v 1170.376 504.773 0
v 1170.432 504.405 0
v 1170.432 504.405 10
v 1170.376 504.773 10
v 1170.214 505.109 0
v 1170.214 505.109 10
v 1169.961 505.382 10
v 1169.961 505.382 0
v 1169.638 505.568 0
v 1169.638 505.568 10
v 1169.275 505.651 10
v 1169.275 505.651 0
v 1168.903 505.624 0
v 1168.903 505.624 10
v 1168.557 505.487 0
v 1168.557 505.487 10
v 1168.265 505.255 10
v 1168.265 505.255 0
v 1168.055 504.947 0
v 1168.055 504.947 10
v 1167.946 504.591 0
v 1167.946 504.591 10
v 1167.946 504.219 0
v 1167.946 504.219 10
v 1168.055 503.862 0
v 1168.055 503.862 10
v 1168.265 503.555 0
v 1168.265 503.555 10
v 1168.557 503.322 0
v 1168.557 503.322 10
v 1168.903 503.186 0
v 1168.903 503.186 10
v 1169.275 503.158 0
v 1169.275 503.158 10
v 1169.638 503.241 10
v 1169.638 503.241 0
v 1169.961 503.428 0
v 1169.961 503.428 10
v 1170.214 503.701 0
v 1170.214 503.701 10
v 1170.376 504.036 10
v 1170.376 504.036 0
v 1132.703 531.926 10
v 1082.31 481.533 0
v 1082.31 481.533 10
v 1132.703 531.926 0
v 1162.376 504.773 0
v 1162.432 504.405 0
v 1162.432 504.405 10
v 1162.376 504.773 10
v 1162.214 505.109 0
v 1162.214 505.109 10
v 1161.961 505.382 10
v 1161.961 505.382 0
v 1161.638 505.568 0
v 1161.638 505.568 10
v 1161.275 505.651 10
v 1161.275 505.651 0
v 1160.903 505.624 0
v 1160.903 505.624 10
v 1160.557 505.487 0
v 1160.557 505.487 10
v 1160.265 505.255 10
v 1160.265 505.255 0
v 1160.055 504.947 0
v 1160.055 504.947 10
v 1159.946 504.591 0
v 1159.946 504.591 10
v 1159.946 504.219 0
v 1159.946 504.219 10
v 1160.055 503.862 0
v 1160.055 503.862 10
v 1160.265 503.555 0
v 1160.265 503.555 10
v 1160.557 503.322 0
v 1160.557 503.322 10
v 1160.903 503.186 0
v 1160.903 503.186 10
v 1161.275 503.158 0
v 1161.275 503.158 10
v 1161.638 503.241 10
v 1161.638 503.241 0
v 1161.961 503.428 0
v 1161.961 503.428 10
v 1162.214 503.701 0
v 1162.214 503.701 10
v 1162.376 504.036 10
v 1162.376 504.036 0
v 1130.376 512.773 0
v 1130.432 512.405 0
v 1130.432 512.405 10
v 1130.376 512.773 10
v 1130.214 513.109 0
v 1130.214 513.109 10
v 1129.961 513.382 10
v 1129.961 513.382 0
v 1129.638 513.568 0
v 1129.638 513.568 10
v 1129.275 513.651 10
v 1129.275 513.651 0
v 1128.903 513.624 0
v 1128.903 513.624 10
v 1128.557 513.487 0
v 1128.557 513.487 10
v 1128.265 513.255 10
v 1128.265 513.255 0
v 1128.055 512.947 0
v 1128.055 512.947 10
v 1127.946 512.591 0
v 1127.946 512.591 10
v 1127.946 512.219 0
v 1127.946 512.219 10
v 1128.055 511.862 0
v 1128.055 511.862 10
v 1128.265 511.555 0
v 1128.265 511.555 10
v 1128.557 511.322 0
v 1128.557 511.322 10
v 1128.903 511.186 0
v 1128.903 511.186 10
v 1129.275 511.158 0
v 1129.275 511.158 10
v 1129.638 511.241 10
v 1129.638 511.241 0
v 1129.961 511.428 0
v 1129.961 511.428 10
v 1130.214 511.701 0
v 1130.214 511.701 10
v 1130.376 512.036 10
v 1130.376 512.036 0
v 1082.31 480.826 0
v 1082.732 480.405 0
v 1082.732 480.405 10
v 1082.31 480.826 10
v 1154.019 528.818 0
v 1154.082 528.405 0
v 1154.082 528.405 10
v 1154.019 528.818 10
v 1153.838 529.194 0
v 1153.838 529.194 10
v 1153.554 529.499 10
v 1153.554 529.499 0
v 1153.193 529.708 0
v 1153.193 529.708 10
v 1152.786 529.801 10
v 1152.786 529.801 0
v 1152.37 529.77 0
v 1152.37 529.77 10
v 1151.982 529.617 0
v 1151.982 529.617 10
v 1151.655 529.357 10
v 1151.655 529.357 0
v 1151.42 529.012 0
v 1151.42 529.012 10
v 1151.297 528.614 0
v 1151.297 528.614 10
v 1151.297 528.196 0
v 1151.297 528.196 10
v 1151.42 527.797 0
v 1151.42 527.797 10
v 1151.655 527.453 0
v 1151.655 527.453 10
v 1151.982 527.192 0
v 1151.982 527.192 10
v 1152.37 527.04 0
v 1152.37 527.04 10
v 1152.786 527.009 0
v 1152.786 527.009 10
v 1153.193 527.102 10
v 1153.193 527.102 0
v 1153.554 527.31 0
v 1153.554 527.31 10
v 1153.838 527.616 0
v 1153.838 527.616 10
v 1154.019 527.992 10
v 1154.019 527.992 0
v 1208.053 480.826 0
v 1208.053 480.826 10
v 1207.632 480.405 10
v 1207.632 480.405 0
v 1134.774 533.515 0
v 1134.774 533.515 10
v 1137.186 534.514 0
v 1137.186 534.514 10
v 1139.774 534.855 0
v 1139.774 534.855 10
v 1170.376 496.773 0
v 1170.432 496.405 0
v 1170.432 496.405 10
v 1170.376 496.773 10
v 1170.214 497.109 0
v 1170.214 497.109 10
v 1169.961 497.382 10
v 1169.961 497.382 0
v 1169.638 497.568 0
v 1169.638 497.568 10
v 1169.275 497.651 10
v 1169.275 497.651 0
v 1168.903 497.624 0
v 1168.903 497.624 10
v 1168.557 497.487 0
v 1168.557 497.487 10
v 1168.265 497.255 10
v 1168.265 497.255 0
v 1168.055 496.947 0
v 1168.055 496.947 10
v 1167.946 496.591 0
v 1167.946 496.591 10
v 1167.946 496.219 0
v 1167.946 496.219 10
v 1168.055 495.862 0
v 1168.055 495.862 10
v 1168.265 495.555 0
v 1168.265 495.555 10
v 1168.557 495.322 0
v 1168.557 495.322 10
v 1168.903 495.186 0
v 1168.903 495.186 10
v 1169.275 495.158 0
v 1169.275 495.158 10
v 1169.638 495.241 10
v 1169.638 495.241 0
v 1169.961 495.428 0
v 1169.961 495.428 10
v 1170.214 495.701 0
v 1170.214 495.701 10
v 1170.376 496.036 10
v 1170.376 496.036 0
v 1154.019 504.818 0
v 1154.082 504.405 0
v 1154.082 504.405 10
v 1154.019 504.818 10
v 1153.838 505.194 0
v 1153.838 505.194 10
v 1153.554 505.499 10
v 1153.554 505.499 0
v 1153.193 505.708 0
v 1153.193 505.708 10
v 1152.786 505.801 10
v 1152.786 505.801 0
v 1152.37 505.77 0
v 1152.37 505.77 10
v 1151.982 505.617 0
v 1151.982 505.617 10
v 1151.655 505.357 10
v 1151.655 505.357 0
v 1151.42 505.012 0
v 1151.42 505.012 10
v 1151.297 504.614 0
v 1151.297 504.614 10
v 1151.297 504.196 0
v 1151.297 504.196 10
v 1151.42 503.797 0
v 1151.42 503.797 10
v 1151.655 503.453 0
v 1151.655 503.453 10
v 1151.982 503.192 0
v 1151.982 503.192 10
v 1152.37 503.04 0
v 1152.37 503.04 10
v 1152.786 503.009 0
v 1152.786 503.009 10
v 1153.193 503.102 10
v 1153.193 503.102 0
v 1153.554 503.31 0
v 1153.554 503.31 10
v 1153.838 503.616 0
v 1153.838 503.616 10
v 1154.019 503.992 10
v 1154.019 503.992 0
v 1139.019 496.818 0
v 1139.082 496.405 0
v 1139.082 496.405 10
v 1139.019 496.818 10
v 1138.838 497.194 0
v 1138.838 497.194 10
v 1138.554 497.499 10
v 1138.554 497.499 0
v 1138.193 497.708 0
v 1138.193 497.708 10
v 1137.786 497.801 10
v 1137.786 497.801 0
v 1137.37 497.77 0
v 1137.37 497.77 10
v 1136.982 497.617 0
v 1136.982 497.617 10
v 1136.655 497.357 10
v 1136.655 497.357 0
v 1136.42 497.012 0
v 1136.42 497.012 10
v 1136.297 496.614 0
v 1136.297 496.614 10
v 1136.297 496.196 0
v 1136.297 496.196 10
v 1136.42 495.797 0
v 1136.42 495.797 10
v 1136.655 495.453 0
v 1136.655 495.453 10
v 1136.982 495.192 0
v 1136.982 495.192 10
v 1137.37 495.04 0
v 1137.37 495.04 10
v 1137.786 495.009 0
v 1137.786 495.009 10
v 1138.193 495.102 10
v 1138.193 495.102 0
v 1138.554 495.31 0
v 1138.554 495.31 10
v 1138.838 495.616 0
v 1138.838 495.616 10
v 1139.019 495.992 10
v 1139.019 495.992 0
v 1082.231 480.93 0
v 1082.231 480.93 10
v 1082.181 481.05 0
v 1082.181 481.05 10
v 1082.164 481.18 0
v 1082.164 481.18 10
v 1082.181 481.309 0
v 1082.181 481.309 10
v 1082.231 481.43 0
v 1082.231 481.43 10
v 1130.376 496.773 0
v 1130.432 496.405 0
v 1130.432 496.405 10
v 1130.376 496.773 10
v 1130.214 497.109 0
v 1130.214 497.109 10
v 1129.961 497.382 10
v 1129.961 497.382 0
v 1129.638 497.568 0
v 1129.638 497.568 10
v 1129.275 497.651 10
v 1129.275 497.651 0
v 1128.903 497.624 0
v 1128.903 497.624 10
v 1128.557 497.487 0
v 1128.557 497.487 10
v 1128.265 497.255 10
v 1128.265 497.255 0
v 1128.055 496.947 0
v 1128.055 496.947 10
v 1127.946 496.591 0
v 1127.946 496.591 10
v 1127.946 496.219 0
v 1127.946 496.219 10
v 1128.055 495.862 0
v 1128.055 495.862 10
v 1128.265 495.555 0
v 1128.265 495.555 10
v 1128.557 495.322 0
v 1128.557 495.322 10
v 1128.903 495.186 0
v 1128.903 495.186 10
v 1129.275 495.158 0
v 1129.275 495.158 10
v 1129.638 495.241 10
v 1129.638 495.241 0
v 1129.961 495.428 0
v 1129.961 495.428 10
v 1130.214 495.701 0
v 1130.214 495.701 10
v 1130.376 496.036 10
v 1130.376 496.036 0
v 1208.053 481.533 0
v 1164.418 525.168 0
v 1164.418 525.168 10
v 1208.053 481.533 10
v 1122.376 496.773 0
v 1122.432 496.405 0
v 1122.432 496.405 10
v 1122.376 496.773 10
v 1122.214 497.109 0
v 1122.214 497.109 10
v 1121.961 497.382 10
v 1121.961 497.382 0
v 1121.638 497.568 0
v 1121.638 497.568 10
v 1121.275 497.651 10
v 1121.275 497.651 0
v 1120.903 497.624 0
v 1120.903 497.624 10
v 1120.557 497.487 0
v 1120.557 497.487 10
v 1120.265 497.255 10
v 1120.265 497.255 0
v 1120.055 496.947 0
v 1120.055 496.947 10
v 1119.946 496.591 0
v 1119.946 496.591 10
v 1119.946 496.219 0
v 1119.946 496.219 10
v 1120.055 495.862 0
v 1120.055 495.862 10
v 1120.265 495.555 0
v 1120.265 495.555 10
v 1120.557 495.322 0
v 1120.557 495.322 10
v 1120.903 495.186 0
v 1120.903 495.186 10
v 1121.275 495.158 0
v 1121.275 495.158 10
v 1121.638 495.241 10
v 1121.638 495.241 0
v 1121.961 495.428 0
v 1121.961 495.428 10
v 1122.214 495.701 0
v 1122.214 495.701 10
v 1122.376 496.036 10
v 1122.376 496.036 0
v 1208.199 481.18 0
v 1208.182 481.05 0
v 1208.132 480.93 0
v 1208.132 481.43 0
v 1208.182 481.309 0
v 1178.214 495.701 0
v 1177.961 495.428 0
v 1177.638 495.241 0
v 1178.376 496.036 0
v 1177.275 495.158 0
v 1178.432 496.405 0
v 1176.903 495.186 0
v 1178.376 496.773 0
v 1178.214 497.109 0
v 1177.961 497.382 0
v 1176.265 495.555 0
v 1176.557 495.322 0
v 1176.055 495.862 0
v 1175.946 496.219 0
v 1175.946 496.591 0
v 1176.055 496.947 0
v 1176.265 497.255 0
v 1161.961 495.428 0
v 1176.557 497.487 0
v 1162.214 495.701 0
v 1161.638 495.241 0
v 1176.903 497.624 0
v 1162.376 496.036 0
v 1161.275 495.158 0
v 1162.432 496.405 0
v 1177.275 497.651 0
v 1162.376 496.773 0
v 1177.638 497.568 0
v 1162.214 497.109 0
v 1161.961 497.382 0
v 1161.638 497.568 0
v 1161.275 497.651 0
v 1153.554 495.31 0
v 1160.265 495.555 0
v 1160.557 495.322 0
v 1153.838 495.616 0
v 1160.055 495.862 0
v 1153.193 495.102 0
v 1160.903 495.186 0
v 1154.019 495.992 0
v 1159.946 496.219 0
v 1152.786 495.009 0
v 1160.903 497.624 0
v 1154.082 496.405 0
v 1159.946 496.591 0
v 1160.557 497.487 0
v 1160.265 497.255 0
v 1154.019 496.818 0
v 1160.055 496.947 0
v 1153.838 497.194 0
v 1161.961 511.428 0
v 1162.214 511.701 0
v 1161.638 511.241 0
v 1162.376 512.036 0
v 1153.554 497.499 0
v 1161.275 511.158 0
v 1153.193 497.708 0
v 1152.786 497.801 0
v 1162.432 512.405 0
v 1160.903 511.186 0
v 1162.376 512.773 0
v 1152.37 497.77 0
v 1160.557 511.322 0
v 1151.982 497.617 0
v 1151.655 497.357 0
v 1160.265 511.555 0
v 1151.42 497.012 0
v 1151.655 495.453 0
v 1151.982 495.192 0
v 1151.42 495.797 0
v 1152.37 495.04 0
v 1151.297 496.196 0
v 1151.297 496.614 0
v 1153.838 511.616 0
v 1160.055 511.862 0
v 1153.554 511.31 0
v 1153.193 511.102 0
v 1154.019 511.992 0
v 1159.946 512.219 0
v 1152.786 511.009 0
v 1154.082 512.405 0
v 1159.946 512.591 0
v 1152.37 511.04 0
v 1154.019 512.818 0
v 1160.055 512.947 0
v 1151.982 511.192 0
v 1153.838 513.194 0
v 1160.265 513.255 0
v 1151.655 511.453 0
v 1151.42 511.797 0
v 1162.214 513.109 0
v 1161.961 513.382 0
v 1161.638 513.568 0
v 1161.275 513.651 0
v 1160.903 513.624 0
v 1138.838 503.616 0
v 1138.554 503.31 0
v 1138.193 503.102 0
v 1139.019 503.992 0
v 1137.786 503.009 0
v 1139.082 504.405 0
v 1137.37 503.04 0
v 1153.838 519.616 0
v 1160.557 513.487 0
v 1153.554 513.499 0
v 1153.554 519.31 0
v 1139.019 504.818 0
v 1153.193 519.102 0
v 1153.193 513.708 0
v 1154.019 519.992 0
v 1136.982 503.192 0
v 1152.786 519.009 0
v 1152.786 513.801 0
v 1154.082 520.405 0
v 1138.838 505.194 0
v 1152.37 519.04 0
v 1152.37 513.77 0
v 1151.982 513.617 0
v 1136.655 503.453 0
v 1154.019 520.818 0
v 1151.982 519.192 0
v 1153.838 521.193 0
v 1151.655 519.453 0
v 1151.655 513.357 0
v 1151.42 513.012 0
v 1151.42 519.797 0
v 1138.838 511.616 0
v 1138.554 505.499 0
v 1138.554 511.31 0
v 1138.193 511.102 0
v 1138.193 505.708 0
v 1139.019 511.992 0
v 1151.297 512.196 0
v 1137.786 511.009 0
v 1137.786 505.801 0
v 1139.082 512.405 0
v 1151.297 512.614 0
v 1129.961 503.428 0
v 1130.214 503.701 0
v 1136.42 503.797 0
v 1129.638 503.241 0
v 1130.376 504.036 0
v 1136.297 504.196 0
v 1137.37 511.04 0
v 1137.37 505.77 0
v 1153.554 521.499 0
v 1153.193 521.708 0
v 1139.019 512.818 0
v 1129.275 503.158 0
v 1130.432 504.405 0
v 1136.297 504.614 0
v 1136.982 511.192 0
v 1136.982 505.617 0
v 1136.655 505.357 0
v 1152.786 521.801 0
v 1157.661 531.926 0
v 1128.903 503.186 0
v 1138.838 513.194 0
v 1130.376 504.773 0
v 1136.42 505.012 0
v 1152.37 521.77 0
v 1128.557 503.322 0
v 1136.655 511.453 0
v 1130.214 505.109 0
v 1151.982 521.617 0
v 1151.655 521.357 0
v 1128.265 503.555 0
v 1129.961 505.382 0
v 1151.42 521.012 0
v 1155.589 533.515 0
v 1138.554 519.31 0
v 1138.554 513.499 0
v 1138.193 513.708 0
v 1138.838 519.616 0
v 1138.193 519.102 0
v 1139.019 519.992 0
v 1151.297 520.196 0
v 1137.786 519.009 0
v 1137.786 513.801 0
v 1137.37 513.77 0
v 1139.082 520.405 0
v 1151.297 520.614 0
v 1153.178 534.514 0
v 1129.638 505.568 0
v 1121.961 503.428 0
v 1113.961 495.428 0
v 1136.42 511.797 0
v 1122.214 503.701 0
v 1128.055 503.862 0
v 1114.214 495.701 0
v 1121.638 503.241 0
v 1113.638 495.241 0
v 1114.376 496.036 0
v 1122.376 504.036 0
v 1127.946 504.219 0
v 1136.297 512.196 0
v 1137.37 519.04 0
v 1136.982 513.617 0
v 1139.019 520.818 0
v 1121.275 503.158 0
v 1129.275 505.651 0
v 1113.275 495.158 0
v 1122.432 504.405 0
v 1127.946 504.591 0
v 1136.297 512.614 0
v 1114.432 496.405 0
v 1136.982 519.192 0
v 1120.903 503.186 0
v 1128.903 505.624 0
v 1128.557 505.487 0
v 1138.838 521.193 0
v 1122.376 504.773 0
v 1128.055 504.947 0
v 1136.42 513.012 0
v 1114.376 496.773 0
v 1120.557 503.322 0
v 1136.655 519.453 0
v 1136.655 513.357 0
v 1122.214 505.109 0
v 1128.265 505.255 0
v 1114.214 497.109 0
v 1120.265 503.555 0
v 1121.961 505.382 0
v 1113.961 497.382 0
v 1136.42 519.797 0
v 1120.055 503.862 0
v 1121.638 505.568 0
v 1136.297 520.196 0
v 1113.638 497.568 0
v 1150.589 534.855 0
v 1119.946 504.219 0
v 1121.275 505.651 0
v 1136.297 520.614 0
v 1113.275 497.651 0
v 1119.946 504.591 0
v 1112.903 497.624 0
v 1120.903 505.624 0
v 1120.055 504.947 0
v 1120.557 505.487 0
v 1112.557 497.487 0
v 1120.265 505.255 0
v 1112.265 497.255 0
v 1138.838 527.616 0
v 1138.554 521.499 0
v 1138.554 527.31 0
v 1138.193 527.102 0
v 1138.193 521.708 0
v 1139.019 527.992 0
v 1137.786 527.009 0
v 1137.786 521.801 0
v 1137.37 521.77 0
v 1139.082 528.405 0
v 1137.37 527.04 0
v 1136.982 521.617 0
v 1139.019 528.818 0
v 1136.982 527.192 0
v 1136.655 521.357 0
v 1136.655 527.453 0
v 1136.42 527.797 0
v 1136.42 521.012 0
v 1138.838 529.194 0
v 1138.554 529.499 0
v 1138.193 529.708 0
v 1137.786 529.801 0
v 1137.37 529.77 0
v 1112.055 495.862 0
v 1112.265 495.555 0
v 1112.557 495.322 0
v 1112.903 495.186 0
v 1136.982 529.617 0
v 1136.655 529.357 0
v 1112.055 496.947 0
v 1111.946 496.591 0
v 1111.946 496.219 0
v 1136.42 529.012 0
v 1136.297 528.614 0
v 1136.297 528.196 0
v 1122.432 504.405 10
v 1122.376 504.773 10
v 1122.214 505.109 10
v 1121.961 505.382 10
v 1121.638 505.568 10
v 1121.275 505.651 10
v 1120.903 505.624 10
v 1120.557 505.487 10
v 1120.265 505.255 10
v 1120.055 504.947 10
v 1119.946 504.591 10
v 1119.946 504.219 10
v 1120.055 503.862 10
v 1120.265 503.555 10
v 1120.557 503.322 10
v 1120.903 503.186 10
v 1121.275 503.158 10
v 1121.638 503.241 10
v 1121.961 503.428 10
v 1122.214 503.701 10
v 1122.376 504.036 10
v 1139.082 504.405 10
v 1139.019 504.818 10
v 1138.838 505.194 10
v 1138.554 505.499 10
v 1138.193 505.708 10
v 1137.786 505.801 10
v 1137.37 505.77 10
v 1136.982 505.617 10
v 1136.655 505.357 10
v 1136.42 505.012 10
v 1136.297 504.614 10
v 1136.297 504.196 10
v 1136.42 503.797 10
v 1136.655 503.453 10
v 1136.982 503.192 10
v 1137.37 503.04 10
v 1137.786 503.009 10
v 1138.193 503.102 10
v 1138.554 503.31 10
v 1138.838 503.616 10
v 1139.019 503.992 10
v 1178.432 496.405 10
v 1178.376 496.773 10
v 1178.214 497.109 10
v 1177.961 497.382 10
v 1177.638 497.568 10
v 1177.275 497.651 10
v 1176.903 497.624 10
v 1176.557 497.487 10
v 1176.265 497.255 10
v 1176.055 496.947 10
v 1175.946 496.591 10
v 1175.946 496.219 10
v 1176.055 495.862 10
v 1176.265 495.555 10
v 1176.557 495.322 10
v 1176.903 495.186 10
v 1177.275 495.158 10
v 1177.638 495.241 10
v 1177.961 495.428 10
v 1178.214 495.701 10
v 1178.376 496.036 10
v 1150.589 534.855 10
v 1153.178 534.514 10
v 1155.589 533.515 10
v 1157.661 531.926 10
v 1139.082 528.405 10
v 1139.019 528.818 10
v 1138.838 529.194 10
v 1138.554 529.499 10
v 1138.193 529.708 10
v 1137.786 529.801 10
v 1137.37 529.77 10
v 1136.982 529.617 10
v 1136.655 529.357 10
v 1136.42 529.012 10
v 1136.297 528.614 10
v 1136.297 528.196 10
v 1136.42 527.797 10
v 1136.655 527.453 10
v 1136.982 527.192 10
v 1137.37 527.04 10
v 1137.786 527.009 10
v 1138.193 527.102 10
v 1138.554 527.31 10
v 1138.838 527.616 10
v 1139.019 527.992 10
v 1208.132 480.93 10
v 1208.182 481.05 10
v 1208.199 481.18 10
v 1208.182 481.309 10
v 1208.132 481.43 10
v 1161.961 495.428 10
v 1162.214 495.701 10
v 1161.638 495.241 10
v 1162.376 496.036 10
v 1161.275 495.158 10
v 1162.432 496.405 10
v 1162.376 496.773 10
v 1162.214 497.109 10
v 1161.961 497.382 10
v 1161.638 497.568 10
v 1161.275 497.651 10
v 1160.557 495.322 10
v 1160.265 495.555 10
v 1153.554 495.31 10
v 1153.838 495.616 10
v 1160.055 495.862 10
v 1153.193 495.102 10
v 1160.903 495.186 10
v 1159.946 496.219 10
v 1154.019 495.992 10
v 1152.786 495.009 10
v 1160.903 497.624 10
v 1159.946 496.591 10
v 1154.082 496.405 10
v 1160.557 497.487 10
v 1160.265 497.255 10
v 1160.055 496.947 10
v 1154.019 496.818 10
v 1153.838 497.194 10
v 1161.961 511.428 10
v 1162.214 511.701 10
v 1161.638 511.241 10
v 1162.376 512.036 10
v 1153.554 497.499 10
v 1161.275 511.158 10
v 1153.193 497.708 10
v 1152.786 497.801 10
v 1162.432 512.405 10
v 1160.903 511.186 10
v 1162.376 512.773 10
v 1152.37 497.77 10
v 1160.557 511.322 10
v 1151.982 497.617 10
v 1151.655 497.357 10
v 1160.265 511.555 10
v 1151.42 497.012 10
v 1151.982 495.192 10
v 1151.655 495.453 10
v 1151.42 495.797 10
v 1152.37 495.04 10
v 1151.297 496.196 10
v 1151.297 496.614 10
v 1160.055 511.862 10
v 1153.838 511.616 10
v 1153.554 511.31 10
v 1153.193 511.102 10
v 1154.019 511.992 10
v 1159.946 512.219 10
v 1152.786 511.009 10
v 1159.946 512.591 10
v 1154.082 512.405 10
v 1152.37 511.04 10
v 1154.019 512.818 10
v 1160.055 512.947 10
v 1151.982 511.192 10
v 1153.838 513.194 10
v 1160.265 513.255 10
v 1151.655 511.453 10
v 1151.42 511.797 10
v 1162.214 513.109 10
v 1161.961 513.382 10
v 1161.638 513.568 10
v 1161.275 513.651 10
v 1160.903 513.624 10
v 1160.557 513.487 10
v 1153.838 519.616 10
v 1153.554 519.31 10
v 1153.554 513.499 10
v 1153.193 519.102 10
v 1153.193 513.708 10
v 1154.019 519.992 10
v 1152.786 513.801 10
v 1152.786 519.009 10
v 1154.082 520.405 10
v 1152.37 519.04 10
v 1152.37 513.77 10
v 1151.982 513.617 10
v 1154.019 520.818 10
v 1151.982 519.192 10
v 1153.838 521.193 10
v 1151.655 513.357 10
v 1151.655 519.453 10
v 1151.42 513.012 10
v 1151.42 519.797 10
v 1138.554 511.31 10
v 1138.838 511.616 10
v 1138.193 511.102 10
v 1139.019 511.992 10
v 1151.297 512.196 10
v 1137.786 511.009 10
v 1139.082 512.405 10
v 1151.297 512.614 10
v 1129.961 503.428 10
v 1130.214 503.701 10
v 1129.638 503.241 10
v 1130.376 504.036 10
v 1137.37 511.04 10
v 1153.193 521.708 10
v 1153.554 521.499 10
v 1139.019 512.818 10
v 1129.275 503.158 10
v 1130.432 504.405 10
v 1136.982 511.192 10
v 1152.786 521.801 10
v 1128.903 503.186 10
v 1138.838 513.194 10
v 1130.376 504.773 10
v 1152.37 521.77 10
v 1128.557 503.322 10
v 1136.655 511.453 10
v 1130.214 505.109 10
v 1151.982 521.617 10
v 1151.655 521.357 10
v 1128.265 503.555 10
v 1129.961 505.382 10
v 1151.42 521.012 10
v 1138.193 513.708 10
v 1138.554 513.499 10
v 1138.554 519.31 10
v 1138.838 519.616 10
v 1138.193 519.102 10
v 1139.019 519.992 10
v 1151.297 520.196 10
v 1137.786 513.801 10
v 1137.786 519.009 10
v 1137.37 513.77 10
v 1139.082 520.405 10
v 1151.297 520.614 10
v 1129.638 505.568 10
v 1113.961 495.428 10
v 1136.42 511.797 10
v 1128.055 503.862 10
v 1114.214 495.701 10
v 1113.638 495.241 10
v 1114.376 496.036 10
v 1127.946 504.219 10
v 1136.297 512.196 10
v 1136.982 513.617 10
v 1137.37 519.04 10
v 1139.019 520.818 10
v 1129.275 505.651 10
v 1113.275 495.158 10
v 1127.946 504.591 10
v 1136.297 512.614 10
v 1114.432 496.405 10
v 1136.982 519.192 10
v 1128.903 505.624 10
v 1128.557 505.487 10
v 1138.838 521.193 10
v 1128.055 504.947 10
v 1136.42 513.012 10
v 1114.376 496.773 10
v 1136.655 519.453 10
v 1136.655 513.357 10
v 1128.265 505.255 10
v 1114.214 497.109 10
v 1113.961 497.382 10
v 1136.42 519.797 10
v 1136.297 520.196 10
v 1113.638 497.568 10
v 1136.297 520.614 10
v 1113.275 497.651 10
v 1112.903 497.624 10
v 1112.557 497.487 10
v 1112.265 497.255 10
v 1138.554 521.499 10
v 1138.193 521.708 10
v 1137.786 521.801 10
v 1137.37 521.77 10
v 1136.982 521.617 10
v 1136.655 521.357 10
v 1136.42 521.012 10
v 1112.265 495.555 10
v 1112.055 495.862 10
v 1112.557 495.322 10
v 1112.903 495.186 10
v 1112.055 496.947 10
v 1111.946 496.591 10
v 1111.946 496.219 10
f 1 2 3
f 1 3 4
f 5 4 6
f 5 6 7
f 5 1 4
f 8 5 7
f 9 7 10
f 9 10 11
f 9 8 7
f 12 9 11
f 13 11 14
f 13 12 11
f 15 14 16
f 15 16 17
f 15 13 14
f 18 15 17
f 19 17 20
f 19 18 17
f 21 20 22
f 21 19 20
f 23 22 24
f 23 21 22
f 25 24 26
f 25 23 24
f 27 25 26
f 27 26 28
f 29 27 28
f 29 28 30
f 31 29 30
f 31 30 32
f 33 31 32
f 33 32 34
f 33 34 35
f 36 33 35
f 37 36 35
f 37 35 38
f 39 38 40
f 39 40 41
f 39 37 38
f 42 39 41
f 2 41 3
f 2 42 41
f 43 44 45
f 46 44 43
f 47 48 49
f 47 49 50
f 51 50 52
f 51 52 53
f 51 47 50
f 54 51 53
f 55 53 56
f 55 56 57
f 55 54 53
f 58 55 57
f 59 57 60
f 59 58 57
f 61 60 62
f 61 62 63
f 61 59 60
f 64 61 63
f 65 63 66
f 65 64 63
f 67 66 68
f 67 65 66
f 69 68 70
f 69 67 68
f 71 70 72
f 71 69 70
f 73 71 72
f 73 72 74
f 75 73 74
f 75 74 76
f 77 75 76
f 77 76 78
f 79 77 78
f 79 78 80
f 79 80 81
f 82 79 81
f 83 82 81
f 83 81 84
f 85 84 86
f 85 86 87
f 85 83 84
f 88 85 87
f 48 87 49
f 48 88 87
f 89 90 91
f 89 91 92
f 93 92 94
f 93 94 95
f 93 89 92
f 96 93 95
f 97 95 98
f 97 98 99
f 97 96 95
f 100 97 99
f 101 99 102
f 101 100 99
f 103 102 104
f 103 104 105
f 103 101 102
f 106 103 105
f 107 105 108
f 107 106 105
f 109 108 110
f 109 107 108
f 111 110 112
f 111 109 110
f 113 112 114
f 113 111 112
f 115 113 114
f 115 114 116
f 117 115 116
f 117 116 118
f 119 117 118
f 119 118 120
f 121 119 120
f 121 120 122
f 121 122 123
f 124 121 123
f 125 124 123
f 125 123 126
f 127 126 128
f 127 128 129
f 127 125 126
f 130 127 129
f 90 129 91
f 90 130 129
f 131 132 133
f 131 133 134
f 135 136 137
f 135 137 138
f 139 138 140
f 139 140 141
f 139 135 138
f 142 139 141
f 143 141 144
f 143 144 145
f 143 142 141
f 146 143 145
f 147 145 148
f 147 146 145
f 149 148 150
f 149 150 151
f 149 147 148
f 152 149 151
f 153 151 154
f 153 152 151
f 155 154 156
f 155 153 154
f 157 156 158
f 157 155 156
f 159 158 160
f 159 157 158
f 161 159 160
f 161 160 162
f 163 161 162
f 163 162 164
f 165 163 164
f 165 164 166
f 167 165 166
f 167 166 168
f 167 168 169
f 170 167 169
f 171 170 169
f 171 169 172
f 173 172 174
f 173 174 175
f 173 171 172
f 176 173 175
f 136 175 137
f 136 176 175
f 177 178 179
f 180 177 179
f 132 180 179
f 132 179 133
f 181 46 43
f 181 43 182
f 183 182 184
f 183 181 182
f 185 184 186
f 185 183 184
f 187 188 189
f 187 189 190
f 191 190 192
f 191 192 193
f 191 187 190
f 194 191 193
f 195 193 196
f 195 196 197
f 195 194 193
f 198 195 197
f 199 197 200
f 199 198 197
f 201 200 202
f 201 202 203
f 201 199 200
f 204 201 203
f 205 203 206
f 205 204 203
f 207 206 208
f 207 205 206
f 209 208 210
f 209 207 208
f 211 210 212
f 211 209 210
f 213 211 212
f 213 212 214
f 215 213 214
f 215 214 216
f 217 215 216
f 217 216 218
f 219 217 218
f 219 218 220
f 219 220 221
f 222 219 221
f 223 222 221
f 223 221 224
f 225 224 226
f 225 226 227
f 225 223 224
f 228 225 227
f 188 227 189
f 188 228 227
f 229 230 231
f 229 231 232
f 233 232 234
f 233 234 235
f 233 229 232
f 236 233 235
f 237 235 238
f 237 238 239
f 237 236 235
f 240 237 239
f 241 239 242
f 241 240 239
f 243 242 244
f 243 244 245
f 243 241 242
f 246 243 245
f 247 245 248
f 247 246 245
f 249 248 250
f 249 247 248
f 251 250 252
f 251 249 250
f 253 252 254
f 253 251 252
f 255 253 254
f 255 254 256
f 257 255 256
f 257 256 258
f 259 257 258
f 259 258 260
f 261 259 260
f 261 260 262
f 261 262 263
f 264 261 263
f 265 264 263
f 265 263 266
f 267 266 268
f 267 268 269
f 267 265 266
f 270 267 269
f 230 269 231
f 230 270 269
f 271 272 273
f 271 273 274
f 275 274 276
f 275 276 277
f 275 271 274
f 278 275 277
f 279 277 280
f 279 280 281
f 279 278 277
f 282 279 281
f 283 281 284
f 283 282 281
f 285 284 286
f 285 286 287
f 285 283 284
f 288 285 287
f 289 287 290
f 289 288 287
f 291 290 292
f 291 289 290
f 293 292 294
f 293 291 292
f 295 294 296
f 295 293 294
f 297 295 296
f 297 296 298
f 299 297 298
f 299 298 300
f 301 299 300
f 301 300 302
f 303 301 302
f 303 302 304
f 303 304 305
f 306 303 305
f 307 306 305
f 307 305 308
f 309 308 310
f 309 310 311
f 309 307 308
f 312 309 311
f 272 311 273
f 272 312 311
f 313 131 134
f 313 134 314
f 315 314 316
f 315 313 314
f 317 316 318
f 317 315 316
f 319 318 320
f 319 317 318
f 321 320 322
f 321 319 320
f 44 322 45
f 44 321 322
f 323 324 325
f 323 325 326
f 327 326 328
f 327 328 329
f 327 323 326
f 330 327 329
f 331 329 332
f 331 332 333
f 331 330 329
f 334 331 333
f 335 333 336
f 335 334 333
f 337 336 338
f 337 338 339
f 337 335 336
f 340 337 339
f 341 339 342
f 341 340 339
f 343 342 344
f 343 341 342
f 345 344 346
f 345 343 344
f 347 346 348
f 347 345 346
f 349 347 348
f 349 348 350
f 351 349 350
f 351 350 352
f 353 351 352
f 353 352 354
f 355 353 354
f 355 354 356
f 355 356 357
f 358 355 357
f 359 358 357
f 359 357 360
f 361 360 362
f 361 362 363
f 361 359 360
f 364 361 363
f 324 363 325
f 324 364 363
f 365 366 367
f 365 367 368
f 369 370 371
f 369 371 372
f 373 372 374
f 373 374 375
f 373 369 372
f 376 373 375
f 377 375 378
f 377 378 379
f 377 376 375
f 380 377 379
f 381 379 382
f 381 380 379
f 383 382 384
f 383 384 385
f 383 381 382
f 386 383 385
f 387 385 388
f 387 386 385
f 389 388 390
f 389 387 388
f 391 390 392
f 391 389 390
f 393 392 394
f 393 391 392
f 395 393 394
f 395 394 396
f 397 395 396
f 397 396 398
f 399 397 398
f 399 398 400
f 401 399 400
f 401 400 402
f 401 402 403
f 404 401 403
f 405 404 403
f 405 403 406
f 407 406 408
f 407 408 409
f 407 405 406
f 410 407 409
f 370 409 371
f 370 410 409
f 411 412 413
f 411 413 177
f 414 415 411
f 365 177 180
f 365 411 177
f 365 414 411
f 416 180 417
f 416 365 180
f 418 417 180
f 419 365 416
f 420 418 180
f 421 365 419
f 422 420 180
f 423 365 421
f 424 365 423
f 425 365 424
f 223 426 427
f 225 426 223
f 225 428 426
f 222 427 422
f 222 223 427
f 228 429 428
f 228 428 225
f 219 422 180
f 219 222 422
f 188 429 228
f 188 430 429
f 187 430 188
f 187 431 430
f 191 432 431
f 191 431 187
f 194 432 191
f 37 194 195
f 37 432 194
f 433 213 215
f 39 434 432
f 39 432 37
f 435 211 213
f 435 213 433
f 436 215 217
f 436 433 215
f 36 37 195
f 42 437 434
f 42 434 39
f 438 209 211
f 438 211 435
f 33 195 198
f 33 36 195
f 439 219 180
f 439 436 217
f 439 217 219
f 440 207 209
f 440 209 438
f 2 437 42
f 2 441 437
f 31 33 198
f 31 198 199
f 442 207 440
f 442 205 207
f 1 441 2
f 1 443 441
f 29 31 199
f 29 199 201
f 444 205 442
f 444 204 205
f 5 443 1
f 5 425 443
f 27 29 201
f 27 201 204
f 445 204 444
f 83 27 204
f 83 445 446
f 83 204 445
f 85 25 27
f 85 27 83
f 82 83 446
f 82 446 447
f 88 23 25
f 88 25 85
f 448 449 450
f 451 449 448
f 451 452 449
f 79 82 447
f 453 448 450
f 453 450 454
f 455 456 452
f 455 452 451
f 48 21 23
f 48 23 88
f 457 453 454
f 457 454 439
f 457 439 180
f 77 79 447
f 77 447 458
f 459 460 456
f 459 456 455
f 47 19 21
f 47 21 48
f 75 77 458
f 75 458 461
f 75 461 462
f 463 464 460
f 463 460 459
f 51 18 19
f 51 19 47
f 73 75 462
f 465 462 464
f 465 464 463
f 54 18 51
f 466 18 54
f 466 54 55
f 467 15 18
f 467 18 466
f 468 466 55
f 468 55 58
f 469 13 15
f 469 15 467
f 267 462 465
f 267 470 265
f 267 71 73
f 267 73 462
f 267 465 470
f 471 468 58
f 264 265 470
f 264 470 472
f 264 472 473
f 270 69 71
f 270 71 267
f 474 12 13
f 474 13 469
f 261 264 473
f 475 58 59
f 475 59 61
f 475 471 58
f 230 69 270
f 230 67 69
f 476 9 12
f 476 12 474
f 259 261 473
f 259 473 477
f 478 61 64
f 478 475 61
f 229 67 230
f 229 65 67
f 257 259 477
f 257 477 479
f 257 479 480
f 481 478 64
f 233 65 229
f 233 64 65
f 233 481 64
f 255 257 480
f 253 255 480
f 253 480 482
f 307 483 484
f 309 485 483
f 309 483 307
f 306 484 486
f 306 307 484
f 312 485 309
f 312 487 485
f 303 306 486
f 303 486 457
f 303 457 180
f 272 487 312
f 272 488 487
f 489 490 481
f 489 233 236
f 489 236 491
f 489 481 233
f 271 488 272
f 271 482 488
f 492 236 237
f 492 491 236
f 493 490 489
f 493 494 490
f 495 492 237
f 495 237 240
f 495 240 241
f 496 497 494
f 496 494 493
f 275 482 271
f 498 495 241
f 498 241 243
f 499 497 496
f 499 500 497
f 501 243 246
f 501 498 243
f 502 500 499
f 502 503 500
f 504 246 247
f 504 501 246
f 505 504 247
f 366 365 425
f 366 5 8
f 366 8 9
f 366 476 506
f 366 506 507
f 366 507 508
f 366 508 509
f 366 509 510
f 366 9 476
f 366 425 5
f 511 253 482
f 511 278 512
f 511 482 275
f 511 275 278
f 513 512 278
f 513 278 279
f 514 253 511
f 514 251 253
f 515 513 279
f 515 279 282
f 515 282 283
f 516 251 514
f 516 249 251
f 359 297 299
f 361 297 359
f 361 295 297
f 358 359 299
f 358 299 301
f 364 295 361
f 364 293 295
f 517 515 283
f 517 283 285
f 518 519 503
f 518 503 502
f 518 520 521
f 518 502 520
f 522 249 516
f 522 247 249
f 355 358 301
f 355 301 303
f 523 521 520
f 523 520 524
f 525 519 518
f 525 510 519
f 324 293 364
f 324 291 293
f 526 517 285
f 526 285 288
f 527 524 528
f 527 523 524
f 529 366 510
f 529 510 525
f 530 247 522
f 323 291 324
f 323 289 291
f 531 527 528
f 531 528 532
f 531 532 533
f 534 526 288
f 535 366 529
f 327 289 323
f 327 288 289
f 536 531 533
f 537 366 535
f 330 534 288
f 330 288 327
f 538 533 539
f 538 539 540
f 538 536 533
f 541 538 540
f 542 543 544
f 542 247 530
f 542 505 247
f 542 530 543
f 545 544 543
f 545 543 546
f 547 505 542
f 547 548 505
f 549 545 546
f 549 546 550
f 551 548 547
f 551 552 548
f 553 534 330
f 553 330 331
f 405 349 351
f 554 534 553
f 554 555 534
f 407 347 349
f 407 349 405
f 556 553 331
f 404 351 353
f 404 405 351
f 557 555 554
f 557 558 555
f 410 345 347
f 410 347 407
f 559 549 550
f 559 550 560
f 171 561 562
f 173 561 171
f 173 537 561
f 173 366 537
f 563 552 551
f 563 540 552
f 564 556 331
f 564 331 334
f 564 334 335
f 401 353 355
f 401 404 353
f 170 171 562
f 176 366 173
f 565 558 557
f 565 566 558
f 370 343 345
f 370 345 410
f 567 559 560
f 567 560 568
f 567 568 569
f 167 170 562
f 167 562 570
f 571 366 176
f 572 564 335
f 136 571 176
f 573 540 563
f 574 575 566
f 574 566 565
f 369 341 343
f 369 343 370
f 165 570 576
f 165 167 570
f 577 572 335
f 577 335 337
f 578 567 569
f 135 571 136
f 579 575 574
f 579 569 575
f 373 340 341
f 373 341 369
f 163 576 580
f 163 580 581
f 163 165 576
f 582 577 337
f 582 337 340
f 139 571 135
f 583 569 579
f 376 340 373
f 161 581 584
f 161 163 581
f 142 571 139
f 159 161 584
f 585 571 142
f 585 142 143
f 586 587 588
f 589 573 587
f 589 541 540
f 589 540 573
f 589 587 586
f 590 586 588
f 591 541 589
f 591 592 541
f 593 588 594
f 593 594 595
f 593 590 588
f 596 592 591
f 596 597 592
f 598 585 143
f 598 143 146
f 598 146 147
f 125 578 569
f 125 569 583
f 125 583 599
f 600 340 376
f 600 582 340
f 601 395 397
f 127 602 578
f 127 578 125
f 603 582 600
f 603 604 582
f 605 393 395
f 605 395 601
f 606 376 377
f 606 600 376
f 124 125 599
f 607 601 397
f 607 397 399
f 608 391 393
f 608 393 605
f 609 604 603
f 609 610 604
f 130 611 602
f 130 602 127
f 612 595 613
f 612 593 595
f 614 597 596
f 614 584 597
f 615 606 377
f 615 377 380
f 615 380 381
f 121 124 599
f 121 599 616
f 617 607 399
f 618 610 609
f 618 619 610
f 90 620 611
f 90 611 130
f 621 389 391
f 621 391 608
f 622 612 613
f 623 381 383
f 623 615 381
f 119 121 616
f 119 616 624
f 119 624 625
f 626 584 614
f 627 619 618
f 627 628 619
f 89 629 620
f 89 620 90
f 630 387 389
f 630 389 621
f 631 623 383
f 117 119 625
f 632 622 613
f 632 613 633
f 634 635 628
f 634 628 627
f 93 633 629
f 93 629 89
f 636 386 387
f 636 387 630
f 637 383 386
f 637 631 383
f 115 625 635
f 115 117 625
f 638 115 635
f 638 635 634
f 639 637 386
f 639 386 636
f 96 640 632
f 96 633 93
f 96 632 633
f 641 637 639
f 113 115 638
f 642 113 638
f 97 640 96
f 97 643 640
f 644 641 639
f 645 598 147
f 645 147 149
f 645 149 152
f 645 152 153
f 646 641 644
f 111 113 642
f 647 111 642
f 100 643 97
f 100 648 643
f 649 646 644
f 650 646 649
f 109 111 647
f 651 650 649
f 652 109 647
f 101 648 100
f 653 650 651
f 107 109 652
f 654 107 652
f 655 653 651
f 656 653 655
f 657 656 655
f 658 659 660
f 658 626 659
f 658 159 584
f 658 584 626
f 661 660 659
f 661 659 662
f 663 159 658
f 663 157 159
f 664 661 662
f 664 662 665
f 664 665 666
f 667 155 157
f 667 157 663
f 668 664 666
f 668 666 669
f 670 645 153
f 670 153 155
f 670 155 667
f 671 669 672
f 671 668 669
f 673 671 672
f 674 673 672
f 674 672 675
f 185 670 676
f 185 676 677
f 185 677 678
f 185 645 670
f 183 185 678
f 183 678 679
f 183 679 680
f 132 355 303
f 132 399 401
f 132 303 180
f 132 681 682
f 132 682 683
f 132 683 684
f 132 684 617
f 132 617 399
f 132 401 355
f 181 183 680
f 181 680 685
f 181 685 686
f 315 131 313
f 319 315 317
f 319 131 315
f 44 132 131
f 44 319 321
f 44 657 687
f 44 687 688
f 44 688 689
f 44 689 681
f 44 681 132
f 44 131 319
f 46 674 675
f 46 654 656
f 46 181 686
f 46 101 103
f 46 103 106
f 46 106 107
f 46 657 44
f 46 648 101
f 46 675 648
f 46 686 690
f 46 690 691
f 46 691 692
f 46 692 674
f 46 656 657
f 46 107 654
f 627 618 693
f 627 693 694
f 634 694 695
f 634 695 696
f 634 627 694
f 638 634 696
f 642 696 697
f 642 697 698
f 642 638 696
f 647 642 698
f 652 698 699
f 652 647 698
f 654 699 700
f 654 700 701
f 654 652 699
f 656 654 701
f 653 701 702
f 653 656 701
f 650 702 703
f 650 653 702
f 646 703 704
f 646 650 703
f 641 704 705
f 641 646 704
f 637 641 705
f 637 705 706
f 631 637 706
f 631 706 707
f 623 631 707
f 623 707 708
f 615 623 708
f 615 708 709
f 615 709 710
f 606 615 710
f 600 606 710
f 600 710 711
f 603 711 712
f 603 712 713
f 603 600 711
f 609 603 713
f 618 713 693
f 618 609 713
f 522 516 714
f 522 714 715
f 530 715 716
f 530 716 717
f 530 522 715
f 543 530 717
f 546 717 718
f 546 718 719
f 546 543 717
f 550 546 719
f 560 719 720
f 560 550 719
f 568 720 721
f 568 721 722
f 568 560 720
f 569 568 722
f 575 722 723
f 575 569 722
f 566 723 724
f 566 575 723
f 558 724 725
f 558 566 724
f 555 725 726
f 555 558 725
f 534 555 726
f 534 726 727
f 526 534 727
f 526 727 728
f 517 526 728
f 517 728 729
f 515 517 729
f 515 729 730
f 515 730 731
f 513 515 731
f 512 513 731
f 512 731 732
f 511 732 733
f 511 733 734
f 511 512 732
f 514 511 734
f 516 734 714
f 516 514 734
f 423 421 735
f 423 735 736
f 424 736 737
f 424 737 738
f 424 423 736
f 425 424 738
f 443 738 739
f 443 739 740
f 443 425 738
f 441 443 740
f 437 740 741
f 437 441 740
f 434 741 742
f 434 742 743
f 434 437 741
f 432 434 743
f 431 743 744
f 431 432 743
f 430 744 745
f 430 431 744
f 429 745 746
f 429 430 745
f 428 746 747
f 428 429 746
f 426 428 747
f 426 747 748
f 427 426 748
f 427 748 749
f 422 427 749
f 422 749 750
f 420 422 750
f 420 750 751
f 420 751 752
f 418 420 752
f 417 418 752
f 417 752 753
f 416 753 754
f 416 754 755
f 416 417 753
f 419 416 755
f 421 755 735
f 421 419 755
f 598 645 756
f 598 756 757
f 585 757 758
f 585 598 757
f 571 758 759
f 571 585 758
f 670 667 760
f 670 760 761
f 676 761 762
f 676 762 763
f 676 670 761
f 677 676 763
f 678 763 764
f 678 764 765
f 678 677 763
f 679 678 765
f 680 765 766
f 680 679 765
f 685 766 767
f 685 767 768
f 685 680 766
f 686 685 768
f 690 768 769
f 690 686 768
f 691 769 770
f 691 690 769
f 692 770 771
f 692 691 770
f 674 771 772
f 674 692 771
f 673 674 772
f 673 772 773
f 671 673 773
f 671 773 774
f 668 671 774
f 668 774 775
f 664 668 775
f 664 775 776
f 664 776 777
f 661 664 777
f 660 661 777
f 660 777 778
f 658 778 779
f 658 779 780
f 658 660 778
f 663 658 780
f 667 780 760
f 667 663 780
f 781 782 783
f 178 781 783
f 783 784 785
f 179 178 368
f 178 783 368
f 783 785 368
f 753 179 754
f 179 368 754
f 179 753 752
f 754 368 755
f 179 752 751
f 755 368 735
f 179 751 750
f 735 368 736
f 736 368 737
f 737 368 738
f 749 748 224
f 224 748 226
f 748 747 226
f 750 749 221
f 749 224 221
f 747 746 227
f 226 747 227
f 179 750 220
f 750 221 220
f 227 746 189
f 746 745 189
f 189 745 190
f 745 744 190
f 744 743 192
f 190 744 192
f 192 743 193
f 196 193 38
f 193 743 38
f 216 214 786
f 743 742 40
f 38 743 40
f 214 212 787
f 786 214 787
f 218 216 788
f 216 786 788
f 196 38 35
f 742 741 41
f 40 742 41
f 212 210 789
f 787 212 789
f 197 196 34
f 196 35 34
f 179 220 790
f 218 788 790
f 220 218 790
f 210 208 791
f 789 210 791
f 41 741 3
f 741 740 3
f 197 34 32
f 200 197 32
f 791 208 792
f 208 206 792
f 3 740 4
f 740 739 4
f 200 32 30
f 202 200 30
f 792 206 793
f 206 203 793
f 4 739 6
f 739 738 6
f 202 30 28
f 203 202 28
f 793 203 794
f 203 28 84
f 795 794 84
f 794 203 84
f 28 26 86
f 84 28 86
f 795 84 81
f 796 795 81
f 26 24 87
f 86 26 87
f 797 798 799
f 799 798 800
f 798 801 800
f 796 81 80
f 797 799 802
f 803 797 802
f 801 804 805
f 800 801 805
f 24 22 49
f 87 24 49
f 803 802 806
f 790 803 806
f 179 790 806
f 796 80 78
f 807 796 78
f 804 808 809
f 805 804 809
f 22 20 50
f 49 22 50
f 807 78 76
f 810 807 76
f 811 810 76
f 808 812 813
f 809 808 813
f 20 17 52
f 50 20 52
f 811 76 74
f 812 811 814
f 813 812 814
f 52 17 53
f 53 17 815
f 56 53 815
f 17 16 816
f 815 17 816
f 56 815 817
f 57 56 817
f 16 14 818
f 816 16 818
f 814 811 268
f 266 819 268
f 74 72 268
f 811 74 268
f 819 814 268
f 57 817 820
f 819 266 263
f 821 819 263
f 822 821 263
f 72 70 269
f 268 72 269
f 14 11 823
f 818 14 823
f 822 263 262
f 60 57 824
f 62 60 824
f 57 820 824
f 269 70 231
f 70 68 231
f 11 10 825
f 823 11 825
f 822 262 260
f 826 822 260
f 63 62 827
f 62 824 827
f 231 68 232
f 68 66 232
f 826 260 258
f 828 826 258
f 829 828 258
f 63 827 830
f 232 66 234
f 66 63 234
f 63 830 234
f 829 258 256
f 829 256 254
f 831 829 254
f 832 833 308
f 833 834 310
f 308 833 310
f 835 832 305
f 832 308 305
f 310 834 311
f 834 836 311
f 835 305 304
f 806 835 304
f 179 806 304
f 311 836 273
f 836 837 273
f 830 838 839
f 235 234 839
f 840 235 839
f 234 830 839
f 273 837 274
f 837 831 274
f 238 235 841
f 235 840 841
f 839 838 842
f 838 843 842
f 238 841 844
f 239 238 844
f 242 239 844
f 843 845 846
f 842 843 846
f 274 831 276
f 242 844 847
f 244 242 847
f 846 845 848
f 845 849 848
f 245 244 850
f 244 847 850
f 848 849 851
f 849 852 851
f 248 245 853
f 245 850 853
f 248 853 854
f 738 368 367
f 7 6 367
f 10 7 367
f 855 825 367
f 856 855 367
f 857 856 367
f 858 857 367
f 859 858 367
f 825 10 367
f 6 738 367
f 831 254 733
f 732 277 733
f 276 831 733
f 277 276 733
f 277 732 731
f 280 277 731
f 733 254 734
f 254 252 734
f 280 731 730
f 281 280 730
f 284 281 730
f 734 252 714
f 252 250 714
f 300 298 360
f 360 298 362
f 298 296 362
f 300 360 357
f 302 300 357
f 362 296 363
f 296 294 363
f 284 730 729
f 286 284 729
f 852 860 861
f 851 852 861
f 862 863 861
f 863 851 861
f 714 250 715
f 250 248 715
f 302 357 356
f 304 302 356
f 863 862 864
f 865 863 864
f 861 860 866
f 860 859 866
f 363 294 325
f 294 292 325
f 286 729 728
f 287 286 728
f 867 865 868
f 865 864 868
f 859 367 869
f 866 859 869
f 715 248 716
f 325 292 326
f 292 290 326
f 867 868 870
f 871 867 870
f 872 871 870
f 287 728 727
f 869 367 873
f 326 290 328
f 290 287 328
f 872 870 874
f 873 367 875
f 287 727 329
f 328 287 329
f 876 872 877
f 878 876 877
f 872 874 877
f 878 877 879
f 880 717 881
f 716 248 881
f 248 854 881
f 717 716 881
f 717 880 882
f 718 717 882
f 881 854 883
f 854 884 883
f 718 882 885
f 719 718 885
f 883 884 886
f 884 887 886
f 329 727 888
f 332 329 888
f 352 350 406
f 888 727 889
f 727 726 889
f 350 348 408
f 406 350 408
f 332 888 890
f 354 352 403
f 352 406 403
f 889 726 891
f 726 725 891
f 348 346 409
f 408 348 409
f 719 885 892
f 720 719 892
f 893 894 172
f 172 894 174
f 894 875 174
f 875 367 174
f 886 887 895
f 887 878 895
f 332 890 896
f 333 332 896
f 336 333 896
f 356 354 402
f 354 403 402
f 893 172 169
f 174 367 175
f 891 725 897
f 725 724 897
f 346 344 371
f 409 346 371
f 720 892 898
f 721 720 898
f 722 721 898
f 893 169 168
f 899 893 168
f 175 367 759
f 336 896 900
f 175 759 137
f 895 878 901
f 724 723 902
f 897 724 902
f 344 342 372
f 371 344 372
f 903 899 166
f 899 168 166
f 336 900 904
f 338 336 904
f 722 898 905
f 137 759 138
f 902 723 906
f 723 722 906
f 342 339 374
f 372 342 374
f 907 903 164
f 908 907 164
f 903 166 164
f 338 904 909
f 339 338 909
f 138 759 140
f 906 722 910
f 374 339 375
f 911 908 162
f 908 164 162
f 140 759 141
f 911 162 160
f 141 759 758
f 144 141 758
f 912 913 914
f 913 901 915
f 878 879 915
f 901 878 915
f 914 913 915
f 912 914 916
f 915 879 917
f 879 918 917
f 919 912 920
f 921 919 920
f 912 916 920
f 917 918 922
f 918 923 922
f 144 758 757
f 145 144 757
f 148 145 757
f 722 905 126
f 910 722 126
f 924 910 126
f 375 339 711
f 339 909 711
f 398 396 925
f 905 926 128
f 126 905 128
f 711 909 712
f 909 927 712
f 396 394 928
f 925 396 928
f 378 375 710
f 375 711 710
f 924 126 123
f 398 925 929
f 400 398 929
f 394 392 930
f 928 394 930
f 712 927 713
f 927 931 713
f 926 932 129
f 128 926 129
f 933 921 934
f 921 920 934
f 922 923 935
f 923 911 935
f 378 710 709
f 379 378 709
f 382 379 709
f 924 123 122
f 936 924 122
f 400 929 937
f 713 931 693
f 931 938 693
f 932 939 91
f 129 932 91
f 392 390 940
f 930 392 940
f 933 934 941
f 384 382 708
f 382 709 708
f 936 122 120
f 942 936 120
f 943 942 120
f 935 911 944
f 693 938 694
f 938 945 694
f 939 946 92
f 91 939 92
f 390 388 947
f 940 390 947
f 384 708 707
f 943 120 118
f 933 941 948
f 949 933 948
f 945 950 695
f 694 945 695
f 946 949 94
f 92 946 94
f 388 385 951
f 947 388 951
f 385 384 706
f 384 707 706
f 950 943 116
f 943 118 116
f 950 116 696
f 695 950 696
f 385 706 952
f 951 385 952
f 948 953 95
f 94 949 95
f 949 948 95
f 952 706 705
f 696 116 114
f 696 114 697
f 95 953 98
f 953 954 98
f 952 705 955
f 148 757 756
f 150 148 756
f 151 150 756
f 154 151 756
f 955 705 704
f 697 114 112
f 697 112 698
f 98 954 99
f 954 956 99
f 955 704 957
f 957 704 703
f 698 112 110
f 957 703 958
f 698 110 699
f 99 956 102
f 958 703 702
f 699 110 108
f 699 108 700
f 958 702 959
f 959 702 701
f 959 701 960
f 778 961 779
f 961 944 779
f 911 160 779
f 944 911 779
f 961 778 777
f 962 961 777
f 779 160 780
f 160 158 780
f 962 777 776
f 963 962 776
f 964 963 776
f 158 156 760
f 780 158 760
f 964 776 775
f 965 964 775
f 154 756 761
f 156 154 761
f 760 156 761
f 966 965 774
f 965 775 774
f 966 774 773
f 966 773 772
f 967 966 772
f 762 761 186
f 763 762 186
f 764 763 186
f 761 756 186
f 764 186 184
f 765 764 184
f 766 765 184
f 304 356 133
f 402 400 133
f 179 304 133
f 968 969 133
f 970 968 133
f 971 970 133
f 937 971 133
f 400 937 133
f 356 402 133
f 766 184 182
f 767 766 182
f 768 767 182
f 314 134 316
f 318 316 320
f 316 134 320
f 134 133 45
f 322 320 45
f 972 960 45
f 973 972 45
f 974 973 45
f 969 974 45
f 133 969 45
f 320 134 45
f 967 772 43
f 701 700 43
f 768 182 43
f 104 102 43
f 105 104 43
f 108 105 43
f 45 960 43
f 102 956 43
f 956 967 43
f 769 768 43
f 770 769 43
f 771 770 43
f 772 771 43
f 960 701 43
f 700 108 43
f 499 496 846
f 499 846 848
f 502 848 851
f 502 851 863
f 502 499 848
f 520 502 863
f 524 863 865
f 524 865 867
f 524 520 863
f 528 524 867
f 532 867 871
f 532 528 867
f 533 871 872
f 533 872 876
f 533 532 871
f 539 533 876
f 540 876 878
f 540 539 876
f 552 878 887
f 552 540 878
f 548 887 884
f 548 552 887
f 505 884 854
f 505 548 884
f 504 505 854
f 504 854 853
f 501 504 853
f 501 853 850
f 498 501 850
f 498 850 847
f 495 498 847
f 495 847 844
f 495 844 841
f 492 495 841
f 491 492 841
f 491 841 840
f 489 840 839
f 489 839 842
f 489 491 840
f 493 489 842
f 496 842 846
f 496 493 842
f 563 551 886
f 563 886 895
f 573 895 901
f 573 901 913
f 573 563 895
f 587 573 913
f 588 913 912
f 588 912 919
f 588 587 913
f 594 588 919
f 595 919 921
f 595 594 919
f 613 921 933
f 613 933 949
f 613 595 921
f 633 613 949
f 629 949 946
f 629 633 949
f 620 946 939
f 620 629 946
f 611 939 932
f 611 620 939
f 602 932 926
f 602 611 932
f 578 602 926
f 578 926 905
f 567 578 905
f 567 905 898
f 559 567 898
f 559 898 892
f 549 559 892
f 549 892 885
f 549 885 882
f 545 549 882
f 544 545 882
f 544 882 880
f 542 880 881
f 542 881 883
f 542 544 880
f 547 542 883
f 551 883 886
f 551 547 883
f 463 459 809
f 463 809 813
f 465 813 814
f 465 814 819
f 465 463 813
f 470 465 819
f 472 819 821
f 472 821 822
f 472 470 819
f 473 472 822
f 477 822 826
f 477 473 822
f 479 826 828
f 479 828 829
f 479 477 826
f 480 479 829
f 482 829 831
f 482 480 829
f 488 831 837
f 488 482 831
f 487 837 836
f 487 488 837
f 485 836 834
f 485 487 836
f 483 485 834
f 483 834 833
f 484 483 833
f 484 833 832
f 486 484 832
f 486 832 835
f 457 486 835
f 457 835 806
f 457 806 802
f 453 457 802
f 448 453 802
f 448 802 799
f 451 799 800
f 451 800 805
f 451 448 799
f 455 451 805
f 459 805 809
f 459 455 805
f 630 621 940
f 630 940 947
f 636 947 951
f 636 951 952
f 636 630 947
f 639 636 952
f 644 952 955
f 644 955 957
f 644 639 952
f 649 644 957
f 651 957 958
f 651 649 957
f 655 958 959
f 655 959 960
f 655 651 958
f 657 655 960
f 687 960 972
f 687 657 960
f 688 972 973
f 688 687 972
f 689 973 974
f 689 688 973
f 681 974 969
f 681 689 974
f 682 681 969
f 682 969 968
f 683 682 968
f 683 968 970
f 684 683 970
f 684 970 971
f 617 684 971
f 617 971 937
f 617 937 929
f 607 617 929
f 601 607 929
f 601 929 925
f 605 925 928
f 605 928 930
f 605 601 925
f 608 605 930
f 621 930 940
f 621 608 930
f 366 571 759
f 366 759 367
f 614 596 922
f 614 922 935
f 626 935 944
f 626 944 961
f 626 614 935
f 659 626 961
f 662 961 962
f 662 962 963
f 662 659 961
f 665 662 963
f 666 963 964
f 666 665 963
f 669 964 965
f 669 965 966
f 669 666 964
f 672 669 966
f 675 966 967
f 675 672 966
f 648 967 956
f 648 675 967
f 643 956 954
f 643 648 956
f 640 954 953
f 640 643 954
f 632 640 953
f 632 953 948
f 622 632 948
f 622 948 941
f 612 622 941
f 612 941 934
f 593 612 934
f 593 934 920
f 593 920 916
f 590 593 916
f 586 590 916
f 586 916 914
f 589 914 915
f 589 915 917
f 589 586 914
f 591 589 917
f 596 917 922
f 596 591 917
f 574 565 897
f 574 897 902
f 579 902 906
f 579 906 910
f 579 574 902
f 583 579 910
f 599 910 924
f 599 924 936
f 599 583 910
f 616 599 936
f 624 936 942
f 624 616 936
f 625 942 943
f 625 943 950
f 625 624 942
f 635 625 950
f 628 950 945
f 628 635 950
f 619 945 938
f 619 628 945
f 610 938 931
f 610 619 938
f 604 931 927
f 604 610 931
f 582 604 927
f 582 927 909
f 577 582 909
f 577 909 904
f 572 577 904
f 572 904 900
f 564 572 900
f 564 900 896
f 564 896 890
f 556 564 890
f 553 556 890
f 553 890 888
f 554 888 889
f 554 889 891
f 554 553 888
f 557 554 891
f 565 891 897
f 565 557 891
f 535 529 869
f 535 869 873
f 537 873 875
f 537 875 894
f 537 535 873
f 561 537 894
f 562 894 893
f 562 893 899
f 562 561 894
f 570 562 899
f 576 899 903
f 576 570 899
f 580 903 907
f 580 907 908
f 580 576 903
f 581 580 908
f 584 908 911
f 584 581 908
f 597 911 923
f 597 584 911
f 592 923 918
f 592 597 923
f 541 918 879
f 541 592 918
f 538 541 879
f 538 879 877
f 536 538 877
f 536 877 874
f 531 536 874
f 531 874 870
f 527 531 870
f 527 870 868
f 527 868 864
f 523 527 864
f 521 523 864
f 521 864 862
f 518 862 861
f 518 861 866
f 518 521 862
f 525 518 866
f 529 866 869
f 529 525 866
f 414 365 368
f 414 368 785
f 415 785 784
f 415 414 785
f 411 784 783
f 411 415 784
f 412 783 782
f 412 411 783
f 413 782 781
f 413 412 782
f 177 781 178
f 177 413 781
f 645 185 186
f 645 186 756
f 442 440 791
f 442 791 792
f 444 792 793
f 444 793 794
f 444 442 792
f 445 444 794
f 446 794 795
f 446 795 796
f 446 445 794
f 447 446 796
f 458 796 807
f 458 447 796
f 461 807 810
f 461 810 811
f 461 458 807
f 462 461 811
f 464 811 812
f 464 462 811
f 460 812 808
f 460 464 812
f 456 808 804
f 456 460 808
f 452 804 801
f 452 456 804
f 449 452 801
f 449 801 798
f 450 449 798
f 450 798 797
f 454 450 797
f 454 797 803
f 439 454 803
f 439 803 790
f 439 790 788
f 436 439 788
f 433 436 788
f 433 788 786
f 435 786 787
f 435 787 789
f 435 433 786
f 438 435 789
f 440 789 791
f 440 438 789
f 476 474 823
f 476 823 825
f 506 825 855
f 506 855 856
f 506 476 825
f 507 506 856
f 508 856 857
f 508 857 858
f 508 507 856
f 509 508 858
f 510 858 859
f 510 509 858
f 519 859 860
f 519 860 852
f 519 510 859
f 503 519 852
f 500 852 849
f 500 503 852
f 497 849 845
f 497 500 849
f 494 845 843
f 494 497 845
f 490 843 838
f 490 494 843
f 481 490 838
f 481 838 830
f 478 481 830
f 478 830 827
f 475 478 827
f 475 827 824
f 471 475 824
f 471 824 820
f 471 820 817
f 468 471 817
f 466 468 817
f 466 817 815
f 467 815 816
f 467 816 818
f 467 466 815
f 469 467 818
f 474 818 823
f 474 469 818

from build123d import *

# Parameters (mm, degrees)
SKETCH_3_R      = 1.25
SKETCH_3_R_2    = 1.4
EXTRUDE_2_DEPTH = 10


with BuildPart() as part:
    # 草图3 → 凸台-拉伸2 (new body)
    with BuildSketch(Plane.XY):
        with BuildLine():
            Line((1203.23159256, 480.404853327), (1082.731592366, 480.404853327))
            Line((1082.731592366, 480.404853327), (1082.310142824, 480.826300075))
            ThreePointArc((1082.310142824, 480.826300075), (1082.163698991, 481.179854306), (1082.310145601, 481.533406638))
            Line((1082.310145601, 481.533406638), (1132.702661596, 531.925922701))
            ThreePointArc((1132.702661596, 531.925922701), (1135.946895085, 534.093650218), (1139.773729412, 534.854854894))
            Line((1139.773729412, 534.854854894), (1150.589455978, 534.854854894))
            ThreePointArc((1150.589455978, 534.854854894), (1154.416289827, 534.093650416), (1157.660523063, 531.925923433))
            Line((1157.660523063, 531.925923433), (1164.418316344, 525.168131543))
            Line((1164.418316344, 525.168131543), (1208.053038819, 481.533406638))
            ThreePointArc((1208.053038819, 481.533406638), (1208.199485429, 481.179853247), (1208.053038819, 480.826299856))
            Line((1208.053038819, 480.826299856), (1207.631592536, 480.404853327))
            Line((1207.631592536, 480.404853327), (1203.23159256, 480.404853327))
        make_face()
        with Locations((1113.18159221, 496.404853247)):
            Circle(SKETCH_3_R, mode=Mode.SUBTRACT)
        with Locations((1121.18159221, 496.404853247)):
            Circle(SKETCH_3_R, mode=Mode.SUBTRACT)
        with Locations((1129.18159221, 512.404853247)):
            Circle(SKETCH_3_R, mode=Mode.SUBTRACT)
        with Locations((1129.18159221, 504.404853247)):
            Circle(SKETCH_3_R, mode=Mode.SUBTRACT)
        with Locations((1129.18159221, 496.404853247)):
            Circle(SKETCH_3_R, mode=Mode.SUBTRACT)
        with Locations((1121.18159221, 504.404853247)):
            Circle(SKETCH_3_R, mode=Mode.SUBTRACT)
        with Locations((1169.18159221, 504.404853247)):
            Circle(SKETCH_3_R, mode=Mode.SUBTRACT)
        with Locations((1161.18159221, 496.404853247)):
            Circle(SKETCH_3_R, mode=Mode.SUBTRACT)
        with Locations((1161.18159221, 504.404853247)):
            Circle(SKETCH_3_R, mode=Mode.SUBTRACT)
        with Locations((1161.18159221, 512.404853247)):
            Circle(SKETCH_3_R, mode=Mode.SUBTRACT)
        with Locations((1169.18159221, 496.404853247)):
            Circle(SKETCH_3_R, mode=Mode.SUBTRACT)
        with Locations((1177.18159221, 496.404853247)):
            Circle(SKETCH_3_R, mode=Mode.SUBTRACT)
        with Locations((1137.68159221, 496.404853166)):
            Circle(SKETCH_3_R_2, mode=Mode.SUBTRACT)
        with Locations((1152.68159221, 496.404853166)):
            Circle(SKETCH_3_R_2, mode=Mode.SUBTRACT)
        with Locations((1137.68159221, 504.404852614)):
            Circle(SKETCH_3_R_2, mode=Mode.SUBTRACT)
        with Locations((1152.68159221, 504.404852614)):
            Circle(SKETCH_3_R_2, mode=Mode.SUBTRACT)
        with Locations((1137.68159221, 512.404853926)):
            Circle(SKETCH_3_R_2, mode=Mode.SUBTRACT)
        with Locations((1152.68159221, 512.404853926)):
            Circle(SKETCH_3_R_2, mode=Mode.SUBTRACT)
        with Locations((1137.68159221, 520.404851512)):
            Circle(SKETCH_3_R_2, mode=Mode.SUBTRACT)
        with Locations((1152.68159221, 520.404851512)):
            Circle(SKETCH_3_R_2, mode=Mode.SUBTRACT)
        with Locations((1137.68159221, 528.404852823)):
            Circle(SKETCH_3_R_2, mode=Mode.SUBTRACT)
        with Locations((1152.68159221, 528.404852823)):
            Circle(SKETCH_3_R_2, mode=Mode.SUBTRACT)
    extrude(amount=EXTRUDE_2_DEPTH)


solid = part.part
